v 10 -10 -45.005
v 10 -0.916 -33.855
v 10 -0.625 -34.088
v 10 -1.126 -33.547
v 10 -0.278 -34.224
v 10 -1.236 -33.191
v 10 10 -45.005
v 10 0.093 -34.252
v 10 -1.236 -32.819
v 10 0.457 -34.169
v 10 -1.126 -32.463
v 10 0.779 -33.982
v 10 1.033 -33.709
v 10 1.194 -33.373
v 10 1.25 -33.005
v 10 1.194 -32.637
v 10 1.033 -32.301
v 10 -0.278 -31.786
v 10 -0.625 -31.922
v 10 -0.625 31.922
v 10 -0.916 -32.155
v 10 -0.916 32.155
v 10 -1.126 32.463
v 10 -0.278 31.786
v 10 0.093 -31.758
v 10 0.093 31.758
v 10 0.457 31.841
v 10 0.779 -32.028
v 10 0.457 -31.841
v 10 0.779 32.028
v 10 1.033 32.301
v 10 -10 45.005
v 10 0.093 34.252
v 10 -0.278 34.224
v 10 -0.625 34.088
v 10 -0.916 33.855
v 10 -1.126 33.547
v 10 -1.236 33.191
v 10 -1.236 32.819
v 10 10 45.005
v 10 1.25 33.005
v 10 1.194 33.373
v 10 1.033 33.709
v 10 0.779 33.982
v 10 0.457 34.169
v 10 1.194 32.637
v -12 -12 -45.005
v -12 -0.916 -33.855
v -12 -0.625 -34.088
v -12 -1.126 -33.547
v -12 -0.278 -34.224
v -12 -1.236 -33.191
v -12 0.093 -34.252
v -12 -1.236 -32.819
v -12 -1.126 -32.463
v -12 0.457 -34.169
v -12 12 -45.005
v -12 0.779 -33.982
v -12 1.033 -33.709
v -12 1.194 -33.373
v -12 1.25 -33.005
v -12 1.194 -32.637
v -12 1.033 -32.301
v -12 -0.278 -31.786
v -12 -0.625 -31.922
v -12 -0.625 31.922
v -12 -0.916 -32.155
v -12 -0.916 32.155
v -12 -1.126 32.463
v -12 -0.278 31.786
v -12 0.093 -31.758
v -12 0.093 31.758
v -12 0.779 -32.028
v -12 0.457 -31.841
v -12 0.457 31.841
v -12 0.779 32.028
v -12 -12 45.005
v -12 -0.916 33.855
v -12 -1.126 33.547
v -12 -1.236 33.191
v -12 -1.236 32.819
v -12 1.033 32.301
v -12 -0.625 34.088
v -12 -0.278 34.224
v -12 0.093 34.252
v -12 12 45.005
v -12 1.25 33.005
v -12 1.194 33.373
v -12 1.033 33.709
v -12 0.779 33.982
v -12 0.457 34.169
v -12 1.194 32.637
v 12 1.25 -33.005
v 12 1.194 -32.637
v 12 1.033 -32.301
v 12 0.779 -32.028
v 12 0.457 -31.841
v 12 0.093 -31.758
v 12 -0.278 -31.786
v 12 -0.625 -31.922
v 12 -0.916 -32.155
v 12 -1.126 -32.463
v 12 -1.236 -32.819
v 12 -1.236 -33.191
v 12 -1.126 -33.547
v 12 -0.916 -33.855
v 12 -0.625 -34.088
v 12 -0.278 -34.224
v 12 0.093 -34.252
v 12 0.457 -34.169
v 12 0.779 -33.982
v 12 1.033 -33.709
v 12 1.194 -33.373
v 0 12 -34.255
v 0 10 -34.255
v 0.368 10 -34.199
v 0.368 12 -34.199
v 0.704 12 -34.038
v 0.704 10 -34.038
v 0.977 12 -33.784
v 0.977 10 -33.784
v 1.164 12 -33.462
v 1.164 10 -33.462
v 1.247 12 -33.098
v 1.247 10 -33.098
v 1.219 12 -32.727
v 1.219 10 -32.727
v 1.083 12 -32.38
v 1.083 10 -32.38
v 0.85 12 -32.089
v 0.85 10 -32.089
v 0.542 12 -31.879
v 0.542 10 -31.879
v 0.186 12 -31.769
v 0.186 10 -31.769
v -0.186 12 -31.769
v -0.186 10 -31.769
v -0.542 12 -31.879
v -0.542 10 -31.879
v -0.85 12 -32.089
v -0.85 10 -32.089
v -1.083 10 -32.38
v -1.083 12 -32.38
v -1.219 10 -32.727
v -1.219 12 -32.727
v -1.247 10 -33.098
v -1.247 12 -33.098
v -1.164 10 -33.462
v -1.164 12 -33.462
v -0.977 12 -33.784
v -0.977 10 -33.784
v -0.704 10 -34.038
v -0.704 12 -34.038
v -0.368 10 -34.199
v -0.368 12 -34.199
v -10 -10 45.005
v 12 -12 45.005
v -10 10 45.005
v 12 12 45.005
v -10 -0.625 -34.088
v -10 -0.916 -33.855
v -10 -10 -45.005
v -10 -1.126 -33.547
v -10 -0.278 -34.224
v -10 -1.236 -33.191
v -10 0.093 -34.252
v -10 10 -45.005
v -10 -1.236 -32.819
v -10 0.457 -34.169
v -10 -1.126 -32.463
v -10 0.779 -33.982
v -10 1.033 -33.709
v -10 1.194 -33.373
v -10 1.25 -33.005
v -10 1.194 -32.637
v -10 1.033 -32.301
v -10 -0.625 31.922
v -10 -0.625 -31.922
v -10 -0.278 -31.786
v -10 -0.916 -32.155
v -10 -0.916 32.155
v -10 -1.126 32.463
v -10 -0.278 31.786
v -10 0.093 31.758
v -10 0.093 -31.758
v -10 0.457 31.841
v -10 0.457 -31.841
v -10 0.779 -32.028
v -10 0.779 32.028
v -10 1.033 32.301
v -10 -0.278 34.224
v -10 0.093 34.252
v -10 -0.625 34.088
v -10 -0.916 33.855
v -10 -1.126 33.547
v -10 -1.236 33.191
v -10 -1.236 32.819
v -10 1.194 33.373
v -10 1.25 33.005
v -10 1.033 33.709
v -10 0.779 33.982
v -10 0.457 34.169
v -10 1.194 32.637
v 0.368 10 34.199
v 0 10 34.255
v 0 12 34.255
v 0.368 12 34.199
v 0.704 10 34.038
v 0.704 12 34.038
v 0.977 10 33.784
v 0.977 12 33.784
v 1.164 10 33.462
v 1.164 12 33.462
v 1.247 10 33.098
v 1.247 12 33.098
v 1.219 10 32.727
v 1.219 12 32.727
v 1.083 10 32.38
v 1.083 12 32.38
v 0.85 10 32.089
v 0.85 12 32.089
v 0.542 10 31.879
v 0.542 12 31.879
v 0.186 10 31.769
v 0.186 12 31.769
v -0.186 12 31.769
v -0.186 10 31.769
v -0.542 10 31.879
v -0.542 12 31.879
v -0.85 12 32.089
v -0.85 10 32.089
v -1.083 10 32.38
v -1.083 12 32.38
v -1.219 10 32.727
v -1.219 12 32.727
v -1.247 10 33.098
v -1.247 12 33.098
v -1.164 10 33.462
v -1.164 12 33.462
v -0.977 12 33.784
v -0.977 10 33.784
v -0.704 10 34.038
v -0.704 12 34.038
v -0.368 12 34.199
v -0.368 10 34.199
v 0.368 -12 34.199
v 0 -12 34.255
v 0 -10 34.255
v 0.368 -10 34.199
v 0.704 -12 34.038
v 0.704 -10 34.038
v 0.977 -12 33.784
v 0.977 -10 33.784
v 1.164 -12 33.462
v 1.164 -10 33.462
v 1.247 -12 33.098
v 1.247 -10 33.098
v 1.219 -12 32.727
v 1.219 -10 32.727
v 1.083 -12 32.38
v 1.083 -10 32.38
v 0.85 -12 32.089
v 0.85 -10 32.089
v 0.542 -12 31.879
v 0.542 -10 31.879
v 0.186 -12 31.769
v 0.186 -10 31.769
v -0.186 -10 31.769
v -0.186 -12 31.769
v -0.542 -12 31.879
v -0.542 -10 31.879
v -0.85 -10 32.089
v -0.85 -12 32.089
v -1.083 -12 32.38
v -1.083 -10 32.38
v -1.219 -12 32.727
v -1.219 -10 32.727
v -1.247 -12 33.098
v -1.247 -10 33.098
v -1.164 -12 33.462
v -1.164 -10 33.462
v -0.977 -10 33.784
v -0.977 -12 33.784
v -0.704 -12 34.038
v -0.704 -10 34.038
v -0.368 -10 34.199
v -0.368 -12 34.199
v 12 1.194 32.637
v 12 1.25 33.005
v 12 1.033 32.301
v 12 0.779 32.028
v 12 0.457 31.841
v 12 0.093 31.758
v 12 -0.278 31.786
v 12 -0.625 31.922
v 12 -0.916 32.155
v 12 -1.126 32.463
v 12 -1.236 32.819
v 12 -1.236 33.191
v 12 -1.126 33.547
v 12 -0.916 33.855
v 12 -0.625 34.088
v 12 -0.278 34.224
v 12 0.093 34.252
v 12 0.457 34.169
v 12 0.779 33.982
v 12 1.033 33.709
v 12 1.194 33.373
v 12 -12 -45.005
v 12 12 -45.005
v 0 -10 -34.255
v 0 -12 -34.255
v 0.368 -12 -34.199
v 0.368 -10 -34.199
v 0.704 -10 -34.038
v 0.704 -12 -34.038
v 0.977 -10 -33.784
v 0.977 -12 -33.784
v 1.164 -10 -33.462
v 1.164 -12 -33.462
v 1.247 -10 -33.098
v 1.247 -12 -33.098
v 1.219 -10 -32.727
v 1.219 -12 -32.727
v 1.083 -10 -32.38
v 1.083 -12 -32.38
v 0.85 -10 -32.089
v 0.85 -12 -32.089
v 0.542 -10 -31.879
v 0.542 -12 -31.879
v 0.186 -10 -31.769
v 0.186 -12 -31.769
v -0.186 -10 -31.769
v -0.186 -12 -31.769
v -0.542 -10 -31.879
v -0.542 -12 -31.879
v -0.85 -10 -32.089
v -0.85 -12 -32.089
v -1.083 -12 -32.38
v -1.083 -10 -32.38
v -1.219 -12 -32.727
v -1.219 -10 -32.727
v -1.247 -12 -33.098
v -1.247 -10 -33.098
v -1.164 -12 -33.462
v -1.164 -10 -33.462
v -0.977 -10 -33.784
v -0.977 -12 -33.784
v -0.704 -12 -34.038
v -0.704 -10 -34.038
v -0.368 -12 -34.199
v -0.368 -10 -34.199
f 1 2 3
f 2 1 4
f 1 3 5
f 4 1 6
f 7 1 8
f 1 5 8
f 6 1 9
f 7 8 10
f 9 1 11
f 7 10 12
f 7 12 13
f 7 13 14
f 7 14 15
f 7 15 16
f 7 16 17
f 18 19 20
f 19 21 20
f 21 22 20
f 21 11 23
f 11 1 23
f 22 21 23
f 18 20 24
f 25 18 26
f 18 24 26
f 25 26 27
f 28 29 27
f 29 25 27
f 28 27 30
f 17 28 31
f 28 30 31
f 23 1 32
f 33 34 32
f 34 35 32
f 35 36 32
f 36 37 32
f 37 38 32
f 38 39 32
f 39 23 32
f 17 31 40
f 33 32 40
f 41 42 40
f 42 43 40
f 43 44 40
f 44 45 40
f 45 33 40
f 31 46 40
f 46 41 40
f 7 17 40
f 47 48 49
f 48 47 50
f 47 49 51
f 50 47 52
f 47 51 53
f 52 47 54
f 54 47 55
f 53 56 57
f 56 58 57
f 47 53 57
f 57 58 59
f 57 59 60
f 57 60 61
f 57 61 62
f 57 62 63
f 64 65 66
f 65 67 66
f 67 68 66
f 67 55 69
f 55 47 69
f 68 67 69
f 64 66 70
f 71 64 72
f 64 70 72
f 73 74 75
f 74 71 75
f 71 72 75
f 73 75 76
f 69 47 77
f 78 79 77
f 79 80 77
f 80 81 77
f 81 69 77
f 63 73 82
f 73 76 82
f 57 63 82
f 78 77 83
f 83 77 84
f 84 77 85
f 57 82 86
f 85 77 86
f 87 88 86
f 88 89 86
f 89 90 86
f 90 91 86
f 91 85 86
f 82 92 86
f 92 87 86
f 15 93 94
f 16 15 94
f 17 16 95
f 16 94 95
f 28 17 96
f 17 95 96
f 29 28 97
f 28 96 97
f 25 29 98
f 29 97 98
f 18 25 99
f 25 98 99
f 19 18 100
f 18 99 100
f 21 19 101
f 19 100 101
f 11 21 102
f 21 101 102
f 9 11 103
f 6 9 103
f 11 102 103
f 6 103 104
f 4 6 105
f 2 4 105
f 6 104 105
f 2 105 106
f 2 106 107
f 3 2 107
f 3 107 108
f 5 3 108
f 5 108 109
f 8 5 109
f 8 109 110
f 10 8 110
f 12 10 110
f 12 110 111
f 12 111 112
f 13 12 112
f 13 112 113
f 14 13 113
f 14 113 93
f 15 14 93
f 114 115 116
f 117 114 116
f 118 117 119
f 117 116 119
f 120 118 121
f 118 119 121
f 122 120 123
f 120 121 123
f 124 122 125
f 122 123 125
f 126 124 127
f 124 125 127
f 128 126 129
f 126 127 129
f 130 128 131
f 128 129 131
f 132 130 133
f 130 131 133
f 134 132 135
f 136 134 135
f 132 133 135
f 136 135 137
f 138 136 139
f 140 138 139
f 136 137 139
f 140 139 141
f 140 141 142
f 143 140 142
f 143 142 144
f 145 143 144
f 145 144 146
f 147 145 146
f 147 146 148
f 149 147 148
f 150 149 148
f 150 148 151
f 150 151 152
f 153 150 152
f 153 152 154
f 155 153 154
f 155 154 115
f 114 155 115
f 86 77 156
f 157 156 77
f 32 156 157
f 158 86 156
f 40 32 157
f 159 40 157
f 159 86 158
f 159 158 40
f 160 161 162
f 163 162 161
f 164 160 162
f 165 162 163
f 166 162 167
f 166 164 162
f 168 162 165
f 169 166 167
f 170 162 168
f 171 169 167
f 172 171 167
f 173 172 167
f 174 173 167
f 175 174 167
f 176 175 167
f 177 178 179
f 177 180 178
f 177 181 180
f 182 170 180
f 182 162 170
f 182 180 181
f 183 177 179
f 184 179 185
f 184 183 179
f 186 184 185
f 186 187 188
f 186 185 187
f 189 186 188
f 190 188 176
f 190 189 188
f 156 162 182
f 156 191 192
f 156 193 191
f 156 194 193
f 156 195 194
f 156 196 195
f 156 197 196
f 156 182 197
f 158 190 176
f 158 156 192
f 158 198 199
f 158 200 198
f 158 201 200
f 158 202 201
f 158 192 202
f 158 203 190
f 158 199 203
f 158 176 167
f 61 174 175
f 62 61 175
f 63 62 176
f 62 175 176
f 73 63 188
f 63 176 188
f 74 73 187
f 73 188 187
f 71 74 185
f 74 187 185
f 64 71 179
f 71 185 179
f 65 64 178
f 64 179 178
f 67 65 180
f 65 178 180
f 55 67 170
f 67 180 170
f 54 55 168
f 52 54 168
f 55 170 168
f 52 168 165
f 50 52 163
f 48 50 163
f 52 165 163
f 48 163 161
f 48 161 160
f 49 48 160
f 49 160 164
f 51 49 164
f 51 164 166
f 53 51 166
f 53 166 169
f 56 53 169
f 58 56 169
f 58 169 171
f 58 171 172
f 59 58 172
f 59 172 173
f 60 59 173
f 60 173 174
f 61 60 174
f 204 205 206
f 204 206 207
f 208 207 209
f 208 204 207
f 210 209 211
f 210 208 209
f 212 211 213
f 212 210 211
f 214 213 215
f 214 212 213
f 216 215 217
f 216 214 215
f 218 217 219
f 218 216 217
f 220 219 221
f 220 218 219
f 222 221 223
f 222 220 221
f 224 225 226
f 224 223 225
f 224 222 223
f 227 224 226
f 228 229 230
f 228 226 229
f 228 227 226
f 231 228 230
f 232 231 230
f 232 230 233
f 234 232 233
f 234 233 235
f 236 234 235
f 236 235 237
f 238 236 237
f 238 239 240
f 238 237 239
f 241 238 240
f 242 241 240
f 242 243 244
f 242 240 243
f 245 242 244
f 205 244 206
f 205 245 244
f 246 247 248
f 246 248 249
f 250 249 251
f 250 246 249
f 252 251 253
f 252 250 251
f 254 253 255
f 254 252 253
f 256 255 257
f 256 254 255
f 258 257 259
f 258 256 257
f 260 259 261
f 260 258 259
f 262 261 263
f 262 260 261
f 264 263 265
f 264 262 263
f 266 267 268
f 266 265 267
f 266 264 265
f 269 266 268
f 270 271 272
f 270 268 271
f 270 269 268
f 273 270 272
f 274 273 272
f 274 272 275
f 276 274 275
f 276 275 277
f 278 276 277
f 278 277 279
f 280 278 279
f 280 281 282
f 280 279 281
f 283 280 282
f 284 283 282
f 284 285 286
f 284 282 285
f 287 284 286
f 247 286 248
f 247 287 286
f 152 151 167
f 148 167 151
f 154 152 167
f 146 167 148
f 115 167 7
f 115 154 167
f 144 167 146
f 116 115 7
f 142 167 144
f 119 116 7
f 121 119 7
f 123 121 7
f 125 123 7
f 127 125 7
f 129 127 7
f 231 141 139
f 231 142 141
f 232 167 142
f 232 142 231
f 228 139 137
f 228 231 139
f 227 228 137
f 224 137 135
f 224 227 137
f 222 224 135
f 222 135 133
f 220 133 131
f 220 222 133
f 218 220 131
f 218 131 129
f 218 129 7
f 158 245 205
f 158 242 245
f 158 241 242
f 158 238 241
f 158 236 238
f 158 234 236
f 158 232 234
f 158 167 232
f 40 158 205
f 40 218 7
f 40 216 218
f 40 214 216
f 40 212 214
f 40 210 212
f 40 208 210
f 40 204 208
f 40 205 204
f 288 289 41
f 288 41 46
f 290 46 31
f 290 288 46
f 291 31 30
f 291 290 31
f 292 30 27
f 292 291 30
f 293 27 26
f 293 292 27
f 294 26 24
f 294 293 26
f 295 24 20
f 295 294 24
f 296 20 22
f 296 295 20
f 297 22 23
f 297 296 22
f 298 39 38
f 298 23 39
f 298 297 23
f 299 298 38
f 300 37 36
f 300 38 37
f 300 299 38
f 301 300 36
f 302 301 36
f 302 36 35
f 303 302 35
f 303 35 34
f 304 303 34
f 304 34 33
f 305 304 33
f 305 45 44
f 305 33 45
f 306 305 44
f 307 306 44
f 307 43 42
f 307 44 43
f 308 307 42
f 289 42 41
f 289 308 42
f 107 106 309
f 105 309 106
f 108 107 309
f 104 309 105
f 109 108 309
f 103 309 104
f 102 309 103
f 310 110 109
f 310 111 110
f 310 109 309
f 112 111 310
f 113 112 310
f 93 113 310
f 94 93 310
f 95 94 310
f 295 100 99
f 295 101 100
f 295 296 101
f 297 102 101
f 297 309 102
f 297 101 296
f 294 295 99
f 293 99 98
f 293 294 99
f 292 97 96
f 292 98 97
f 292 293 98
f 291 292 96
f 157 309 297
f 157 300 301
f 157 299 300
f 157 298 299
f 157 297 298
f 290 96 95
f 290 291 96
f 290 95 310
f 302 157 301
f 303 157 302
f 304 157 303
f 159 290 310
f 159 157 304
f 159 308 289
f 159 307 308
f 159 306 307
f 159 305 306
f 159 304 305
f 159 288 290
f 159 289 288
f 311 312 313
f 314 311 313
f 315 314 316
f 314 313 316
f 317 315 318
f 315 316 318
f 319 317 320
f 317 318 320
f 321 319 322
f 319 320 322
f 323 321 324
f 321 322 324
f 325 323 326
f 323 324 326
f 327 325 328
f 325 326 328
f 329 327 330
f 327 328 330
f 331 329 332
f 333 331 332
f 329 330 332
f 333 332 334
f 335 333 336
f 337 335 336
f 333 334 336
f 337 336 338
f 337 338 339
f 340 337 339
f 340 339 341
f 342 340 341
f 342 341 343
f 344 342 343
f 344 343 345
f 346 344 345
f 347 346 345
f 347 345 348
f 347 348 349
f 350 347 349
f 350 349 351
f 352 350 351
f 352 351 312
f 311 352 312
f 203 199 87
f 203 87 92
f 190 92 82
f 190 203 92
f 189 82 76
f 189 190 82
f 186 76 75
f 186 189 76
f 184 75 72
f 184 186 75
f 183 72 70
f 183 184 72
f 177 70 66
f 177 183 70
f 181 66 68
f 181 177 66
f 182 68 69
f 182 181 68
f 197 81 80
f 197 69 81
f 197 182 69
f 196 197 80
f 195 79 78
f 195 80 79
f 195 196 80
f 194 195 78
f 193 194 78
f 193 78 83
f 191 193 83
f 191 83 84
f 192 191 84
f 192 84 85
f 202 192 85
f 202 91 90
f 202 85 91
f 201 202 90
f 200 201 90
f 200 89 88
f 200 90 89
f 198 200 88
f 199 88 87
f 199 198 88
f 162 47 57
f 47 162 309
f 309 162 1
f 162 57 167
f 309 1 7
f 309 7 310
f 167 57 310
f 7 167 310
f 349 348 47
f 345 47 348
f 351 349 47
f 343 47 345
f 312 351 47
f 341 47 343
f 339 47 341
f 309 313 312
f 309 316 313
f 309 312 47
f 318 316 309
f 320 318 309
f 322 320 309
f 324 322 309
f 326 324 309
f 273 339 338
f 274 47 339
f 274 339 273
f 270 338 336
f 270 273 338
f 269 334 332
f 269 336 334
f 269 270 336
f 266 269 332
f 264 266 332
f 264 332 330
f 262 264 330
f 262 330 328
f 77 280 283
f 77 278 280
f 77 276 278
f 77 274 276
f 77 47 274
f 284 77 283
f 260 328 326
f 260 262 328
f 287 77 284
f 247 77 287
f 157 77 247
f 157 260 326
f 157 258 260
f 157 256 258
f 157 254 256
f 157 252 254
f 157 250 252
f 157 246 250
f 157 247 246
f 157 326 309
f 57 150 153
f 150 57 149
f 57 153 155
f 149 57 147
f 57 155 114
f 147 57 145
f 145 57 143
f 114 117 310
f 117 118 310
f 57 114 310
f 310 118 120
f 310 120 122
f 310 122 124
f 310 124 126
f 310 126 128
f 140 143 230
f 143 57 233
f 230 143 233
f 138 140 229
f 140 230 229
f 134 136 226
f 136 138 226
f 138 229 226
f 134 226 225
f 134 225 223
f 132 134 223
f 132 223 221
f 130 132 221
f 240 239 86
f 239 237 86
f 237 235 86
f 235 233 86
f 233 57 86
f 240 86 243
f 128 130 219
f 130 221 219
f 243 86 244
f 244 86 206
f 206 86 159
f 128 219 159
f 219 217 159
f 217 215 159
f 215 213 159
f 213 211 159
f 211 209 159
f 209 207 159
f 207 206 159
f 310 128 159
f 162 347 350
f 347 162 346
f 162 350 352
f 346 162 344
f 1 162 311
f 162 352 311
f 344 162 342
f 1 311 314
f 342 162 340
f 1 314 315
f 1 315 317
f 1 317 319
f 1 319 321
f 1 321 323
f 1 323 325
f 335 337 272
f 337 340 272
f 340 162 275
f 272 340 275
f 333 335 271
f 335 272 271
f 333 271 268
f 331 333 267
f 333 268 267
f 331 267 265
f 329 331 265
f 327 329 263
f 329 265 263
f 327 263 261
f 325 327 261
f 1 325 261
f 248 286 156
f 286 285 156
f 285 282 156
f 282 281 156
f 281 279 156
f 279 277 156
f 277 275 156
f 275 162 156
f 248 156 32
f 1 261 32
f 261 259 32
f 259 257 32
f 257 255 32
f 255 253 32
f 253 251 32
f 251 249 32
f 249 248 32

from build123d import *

# Parameters (mm, degrees)
SKETCH_1_W         = 24
SKETCH_1_H         = 24
SKETCH_1_W_2       = 20
SKETCH_1_H_2       = 20
EXTRUDE_1_DEPTH    = 45.005
HOLE_WIZARD_M3_1_D = 2.5
HOLE_WIZARD_M3_2_D = 2.5


with BuildPart() as part:
    # 草图1 → 凸台-拉伸1 (new, symmetric)
    with BuildSketch(Plane.XY):
        Rectangle(SKETCH_1_W, SKETCH_1_H)
        Rectangle(SKETCH_1_W_2, SKETCH_1_H_2, mode=Mode.SUBTRACT)
    extrude(amount=EXTRUDE_1_DEPTH, both=True)

    # M3 螺纹孔的螺纹孔钻头1 (through all)
    with Locations(Plane(origin=(-12, 0, -33.005), x_dir=(0, -1, 0), z_dir=(-1, 0, 0))):
        with Locations((0, 0)):
            hole_wizard_m3_1 = Hole(HOLE_WIZARD_M3_1_D / 2)

    # 镜向1: M3 螺纹孔的螺纹孔钻头1 across plane
    add(hole_wizard_m3_1.mirror(Plane.XY), mode=Mode.SUBTRACT)

    # M3 螺纹孔的螺纹孔钻头2 (through all)
    with Locations(Plane(origin=(0, 12, -33.005), x_dir=(0, 0, 1), z_dir=(0, 1, 0))):
        with Locations((0, 0)):
            hole_wizard_m3_2 = Hole(HOLE_WIZARD_M3_2_D / 2)

    # 镜向2: M3 螺纹孔的螺纹孔钻头2 across plane
    add(hole_wizard_m3_2.mirror(Plane.XY), mode=Mode.SUBTRACT)


solid = part.part
